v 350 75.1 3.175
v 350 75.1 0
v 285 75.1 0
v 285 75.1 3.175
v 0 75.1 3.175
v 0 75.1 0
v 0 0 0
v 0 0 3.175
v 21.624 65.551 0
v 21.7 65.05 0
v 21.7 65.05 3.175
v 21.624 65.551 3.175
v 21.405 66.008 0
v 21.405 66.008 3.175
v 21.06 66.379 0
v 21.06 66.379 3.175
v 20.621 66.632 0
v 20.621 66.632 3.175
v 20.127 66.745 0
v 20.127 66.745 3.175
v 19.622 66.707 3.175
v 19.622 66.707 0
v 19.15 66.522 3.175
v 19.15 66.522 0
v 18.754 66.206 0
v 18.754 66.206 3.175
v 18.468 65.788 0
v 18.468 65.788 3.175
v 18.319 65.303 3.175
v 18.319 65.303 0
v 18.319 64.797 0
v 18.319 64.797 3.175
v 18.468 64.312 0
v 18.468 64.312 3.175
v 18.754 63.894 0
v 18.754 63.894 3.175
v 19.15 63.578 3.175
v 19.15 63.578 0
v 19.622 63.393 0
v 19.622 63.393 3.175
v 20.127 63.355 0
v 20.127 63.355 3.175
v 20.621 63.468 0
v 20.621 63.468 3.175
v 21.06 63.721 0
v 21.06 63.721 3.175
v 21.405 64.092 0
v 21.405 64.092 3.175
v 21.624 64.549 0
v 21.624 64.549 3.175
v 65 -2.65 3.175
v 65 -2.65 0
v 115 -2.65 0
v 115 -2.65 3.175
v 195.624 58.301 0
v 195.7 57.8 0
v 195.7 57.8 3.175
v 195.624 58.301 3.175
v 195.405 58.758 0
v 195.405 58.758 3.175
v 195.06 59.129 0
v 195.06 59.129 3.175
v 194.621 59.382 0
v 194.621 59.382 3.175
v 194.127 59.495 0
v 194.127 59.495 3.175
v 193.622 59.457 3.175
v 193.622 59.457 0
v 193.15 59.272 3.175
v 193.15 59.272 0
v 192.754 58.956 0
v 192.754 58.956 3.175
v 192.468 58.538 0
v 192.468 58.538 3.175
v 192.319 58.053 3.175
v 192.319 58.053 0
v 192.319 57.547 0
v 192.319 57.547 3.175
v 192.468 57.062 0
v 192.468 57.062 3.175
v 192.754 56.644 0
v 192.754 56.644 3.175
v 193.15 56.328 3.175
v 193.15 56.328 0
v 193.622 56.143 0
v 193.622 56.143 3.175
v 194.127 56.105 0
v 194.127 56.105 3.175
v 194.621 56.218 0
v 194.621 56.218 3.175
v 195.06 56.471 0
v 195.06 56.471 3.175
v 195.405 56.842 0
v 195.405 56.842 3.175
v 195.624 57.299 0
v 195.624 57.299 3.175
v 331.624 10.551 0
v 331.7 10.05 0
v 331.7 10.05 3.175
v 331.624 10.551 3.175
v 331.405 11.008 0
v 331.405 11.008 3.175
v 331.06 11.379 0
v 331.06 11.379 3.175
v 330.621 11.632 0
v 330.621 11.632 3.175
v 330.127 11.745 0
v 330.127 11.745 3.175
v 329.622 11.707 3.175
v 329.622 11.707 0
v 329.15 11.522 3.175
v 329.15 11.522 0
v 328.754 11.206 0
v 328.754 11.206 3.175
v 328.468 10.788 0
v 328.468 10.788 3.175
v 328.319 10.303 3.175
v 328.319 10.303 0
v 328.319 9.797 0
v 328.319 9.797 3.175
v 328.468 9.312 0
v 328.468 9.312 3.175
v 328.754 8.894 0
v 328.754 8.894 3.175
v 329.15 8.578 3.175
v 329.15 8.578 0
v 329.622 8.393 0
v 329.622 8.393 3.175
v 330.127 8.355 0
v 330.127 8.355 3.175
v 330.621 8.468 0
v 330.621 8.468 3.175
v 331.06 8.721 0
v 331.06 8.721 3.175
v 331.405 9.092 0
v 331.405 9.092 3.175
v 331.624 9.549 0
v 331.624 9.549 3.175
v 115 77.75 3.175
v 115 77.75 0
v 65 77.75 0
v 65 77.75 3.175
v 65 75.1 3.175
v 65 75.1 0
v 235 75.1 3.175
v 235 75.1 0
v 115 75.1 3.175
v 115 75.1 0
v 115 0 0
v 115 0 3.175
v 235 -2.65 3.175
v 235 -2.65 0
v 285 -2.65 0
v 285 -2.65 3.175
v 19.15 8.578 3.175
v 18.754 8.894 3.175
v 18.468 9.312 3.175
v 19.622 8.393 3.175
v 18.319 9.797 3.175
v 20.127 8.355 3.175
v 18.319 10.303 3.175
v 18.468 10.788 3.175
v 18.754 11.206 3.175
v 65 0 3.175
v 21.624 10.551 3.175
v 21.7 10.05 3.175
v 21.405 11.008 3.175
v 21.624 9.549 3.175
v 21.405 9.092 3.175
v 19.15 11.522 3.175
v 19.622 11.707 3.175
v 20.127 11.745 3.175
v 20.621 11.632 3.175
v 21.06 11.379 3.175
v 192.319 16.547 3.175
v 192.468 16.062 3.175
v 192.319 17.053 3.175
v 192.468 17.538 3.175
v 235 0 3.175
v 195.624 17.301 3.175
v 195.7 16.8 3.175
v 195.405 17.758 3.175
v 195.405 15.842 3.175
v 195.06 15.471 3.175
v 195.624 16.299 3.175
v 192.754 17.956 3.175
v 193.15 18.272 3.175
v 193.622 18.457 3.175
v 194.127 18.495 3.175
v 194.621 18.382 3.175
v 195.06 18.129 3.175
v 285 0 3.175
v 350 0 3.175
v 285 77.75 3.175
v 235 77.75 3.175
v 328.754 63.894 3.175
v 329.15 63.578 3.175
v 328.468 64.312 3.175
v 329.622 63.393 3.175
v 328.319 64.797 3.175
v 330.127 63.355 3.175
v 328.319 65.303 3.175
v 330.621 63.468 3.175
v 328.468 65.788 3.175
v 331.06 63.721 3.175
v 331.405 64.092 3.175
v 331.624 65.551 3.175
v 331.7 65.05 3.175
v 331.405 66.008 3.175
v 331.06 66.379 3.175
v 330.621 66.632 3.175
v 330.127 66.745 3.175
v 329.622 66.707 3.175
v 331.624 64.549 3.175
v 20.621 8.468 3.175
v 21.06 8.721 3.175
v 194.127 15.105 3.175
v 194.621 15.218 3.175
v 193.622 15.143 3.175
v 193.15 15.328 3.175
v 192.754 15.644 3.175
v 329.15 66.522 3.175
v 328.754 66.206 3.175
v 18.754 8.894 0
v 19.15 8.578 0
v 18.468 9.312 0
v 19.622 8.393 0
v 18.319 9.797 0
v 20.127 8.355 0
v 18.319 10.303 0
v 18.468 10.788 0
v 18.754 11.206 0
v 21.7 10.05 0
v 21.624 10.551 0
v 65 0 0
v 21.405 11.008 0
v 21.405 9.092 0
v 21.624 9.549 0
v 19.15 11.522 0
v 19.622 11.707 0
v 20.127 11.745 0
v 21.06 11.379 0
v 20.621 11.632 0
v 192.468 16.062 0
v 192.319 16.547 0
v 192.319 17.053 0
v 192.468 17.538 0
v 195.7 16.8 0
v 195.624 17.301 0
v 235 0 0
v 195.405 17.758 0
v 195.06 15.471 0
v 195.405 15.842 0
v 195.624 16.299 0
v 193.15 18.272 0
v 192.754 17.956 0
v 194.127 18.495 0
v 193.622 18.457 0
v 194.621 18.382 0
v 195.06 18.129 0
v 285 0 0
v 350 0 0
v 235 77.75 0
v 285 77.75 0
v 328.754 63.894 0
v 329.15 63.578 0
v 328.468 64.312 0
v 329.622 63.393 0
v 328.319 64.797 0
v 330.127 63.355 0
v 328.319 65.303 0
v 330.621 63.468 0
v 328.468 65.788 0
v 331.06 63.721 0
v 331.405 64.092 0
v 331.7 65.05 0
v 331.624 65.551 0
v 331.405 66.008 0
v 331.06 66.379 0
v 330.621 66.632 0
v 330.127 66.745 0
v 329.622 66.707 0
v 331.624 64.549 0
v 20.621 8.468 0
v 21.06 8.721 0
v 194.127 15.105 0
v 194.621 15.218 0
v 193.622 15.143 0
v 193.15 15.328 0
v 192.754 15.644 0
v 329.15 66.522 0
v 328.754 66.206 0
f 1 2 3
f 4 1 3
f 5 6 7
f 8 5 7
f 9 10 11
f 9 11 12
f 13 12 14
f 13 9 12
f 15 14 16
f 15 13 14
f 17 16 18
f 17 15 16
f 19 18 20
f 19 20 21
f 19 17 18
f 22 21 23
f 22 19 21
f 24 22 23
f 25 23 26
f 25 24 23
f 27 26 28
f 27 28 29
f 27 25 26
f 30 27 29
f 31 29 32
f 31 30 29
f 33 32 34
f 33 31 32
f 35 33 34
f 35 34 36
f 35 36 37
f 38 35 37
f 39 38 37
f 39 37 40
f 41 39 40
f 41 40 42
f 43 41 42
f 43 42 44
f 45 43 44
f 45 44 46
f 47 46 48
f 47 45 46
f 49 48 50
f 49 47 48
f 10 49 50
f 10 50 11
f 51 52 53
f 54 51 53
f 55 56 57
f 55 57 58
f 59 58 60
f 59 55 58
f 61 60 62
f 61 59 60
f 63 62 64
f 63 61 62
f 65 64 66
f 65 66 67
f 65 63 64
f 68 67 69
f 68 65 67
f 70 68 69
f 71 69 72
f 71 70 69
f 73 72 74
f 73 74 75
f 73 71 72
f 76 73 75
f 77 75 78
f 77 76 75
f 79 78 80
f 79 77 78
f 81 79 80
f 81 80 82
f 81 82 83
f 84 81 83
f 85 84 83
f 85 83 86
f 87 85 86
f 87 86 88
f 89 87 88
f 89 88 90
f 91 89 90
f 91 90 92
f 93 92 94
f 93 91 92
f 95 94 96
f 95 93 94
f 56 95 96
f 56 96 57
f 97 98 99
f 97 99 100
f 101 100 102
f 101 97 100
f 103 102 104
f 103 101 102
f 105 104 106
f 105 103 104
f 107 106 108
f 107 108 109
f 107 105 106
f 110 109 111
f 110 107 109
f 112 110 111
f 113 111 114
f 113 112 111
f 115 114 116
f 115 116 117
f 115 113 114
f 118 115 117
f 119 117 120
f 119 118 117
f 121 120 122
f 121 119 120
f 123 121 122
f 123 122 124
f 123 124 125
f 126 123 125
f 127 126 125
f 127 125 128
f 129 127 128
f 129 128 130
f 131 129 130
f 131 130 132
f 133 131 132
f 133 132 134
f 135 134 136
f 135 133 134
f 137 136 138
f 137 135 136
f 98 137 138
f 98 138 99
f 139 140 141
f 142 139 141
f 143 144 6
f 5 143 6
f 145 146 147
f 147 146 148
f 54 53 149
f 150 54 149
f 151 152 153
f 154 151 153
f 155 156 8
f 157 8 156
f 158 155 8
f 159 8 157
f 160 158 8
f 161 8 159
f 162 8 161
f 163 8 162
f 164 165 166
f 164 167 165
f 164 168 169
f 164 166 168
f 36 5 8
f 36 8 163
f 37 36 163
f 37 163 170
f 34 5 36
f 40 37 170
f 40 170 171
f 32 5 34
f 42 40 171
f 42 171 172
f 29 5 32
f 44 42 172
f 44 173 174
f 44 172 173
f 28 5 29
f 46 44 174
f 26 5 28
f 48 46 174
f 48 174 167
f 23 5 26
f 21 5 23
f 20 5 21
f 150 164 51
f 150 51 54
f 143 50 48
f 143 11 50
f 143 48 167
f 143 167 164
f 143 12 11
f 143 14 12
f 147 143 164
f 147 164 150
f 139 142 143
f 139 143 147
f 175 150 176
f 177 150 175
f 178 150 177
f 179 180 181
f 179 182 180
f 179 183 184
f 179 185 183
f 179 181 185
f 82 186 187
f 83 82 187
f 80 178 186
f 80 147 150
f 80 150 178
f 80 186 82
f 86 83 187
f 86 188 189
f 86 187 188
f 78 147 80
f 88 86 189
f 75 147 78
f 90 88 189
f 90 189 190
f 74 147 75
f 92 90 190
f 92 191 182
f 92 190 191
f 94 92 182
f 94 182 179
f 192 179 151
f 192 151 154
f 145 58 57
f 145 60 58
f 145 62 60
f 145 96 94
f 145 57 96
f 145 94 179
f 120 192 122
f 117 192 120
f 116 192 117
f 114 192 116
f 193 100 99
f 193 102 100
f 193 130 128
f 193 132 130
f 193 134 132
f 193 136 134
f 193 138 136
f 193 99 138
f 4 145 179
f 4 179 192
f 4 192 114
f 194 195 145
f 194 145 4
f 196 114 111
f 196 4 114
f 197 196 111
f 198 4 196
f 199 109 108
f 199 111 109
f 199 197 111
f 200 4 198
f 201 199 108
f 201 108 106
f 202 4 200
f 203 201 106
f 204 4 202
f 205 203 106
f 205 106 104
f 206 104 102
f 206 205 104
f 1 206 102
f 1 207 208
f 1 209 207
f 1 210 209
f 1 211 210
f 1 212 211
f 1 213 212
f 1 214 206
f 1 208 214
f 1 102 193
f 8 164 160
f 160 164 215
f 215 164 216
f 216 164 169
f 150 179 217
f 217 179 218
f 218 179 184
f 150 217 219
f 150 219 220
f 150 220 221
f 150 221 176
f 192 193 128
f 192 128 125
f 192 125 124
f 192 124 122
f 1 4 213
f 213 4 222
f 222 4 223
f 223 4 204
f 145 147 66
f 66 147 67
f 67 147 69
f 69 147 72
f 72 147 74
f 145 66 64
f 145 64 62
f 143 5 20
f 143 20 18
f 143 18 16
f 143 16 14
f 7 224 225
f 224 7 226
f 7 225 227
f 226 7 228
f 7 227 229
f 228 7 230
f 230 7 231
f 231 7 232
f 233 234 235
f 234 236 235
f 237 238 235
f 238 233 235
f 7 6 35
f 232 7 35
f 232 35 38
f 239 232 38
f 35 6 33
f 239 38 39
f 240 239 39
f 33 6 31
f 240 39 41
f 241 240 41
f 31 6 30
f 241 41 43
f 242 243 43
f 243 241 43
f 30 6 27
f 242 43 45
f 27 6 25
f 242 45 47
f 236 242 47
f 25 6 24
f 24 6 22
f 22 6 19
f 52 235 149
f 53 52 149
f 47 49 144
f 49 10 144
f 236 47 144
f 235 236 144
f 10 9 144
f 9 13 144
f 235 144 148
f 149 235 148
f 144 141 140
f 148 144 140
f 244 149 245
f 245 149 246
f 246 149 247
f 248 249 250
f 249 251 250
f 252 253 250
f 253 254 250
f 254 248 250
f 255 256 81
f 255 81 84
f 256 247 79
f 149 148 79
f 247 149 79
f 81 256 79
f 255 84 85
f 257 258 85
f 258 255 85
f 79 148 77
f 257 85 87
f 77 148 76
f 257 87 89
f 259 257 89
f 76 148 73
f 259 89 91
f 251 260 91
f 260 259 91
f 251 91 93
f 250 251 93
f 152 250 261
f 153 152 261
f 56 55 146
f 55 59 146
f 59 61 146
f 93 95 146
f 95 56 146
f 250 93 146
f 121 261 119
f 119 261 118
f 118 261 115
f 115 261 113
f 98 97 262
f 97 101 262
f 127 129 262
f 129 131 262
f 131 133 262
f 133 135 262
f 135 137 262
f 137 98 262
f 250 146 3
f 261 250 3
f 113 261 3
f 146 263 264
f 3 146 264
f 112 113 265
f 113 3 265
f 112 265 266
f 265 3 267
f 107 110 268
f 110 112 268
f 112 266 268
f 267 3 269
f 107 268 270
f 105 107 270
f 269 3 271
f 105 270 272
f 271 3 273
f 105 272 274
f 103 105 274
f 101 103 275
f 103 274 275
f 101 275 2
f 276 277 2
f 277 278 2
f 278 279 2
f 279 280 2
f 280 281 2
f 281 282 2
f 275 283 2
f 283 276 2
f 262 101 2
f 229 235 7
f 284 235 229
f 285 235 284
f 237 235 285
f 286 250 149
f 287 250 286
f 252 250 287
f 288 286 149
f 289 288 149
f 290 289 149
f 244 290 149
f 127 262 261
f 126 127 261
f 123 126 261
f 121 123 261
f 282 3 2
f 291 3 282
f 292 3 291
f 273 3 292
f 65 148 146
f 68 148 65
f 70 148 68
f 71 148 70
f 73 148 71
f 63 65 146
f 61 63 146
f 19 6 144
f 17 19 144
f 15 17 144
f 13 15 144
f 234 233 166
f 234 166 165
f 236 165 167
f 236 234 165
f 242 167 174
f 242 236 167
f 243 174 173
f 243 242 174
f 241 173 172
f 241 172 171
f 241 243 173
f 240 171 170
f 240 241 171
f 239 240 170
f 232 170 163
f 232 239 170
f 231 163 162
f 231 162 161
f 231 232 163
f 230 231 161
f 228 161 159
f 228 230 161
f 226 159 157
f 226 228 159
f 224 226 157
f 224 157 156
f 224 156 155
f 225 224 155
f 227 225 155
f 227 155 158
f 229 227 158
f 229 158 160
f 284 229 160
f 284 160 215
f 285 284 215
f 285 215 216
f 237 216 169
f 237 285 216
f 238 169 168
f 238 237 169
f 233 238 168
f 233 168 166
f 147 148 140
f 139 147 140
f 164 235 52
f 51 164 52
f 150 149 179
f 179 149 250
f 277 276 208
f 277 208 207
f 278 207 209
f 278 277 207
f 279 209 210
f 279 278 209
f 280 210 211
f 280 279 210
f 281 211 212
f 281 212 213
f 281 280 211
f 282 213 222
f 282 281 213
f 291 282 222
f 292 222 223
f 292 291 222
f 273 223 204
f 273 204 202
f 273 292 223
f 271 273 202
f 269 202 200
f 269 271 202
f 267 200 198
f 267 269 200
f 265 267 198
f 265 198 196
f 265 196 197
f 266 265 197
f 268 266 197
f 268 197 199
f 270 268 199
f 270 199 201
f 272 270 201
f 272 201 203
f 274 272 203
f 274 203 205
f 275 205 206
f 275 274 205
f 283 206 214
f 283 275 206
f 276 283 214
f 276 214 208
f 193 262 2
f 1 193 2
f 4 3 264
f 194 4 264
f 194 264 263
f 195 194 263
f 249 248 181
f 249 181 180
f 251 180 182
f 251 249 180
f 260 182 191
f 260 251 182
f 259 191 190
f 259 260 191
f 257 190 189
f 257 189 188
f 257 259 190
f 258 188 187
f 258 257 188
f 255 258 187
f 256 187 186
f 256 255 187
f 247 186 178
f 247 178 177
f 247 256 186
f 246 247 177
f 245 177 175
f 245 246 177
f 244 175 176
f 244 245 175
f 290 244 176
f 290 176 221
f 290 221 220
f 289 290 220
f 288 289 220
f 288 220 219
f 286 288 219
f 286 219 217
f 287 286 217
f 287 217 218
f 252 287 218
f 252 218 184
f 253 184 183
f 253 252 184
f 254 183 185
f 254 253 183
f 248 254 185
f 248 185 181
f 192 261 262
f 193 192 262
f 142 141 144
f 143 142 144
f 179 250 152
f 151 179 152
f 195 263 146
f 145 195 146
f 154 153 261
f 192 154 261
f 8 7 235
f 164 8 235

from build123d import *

# Parameters (mm, degrees)
SKETCH2_R           = 1.7
BOSS_EXTRUDE1_DEPTH = 3.175


with BuildPart() as part:
    # Sketch2 → Boss-Extrude1 (new body)
    with BuildSketch(Plane.XY):
        Polygon((0, 0), (65, 0), (65, -2.65), (115, -2.65), (115, 0), (235, 0), (235, -2.65), (285, -2.65), (285, 0), (350, 0), (350, 75.1), (285, 75.1), (285, 77.75), (235, 77.75), (235, 75.1), (115, 75.1), (115, 77.75), (65, 77.75), (65, 75.1), (0, 75.1), align=None)
        with Locations((20, 10.05)):
            Circle(SKETCH2_R, mode=Mode.SUBTRACT)
        with Locations((330, 10.05)):
            Circle(SKETCH2_R, mode=Mode.SUBTRACT)
        with Locations((330, 65.05)):
            Circle(SKETCH2_R, mode=Mode.SUBTRACT)
        with Locations((20, 65.05)):
            Circle(SKETCH2_R, mode=Mode.SUBTRACT)
        with Locations((194, 16.8)):
            Circle(SKETCH2_R, mode=Mode.SUBTRACT)
        with Locations((194, 57.8)):
            Circle(SKETCH2_R, mode=Mode.SUBTRACT)
    extrude(amount=BOSS_EXTRUDE1_DEPTH)


solid = part.part
